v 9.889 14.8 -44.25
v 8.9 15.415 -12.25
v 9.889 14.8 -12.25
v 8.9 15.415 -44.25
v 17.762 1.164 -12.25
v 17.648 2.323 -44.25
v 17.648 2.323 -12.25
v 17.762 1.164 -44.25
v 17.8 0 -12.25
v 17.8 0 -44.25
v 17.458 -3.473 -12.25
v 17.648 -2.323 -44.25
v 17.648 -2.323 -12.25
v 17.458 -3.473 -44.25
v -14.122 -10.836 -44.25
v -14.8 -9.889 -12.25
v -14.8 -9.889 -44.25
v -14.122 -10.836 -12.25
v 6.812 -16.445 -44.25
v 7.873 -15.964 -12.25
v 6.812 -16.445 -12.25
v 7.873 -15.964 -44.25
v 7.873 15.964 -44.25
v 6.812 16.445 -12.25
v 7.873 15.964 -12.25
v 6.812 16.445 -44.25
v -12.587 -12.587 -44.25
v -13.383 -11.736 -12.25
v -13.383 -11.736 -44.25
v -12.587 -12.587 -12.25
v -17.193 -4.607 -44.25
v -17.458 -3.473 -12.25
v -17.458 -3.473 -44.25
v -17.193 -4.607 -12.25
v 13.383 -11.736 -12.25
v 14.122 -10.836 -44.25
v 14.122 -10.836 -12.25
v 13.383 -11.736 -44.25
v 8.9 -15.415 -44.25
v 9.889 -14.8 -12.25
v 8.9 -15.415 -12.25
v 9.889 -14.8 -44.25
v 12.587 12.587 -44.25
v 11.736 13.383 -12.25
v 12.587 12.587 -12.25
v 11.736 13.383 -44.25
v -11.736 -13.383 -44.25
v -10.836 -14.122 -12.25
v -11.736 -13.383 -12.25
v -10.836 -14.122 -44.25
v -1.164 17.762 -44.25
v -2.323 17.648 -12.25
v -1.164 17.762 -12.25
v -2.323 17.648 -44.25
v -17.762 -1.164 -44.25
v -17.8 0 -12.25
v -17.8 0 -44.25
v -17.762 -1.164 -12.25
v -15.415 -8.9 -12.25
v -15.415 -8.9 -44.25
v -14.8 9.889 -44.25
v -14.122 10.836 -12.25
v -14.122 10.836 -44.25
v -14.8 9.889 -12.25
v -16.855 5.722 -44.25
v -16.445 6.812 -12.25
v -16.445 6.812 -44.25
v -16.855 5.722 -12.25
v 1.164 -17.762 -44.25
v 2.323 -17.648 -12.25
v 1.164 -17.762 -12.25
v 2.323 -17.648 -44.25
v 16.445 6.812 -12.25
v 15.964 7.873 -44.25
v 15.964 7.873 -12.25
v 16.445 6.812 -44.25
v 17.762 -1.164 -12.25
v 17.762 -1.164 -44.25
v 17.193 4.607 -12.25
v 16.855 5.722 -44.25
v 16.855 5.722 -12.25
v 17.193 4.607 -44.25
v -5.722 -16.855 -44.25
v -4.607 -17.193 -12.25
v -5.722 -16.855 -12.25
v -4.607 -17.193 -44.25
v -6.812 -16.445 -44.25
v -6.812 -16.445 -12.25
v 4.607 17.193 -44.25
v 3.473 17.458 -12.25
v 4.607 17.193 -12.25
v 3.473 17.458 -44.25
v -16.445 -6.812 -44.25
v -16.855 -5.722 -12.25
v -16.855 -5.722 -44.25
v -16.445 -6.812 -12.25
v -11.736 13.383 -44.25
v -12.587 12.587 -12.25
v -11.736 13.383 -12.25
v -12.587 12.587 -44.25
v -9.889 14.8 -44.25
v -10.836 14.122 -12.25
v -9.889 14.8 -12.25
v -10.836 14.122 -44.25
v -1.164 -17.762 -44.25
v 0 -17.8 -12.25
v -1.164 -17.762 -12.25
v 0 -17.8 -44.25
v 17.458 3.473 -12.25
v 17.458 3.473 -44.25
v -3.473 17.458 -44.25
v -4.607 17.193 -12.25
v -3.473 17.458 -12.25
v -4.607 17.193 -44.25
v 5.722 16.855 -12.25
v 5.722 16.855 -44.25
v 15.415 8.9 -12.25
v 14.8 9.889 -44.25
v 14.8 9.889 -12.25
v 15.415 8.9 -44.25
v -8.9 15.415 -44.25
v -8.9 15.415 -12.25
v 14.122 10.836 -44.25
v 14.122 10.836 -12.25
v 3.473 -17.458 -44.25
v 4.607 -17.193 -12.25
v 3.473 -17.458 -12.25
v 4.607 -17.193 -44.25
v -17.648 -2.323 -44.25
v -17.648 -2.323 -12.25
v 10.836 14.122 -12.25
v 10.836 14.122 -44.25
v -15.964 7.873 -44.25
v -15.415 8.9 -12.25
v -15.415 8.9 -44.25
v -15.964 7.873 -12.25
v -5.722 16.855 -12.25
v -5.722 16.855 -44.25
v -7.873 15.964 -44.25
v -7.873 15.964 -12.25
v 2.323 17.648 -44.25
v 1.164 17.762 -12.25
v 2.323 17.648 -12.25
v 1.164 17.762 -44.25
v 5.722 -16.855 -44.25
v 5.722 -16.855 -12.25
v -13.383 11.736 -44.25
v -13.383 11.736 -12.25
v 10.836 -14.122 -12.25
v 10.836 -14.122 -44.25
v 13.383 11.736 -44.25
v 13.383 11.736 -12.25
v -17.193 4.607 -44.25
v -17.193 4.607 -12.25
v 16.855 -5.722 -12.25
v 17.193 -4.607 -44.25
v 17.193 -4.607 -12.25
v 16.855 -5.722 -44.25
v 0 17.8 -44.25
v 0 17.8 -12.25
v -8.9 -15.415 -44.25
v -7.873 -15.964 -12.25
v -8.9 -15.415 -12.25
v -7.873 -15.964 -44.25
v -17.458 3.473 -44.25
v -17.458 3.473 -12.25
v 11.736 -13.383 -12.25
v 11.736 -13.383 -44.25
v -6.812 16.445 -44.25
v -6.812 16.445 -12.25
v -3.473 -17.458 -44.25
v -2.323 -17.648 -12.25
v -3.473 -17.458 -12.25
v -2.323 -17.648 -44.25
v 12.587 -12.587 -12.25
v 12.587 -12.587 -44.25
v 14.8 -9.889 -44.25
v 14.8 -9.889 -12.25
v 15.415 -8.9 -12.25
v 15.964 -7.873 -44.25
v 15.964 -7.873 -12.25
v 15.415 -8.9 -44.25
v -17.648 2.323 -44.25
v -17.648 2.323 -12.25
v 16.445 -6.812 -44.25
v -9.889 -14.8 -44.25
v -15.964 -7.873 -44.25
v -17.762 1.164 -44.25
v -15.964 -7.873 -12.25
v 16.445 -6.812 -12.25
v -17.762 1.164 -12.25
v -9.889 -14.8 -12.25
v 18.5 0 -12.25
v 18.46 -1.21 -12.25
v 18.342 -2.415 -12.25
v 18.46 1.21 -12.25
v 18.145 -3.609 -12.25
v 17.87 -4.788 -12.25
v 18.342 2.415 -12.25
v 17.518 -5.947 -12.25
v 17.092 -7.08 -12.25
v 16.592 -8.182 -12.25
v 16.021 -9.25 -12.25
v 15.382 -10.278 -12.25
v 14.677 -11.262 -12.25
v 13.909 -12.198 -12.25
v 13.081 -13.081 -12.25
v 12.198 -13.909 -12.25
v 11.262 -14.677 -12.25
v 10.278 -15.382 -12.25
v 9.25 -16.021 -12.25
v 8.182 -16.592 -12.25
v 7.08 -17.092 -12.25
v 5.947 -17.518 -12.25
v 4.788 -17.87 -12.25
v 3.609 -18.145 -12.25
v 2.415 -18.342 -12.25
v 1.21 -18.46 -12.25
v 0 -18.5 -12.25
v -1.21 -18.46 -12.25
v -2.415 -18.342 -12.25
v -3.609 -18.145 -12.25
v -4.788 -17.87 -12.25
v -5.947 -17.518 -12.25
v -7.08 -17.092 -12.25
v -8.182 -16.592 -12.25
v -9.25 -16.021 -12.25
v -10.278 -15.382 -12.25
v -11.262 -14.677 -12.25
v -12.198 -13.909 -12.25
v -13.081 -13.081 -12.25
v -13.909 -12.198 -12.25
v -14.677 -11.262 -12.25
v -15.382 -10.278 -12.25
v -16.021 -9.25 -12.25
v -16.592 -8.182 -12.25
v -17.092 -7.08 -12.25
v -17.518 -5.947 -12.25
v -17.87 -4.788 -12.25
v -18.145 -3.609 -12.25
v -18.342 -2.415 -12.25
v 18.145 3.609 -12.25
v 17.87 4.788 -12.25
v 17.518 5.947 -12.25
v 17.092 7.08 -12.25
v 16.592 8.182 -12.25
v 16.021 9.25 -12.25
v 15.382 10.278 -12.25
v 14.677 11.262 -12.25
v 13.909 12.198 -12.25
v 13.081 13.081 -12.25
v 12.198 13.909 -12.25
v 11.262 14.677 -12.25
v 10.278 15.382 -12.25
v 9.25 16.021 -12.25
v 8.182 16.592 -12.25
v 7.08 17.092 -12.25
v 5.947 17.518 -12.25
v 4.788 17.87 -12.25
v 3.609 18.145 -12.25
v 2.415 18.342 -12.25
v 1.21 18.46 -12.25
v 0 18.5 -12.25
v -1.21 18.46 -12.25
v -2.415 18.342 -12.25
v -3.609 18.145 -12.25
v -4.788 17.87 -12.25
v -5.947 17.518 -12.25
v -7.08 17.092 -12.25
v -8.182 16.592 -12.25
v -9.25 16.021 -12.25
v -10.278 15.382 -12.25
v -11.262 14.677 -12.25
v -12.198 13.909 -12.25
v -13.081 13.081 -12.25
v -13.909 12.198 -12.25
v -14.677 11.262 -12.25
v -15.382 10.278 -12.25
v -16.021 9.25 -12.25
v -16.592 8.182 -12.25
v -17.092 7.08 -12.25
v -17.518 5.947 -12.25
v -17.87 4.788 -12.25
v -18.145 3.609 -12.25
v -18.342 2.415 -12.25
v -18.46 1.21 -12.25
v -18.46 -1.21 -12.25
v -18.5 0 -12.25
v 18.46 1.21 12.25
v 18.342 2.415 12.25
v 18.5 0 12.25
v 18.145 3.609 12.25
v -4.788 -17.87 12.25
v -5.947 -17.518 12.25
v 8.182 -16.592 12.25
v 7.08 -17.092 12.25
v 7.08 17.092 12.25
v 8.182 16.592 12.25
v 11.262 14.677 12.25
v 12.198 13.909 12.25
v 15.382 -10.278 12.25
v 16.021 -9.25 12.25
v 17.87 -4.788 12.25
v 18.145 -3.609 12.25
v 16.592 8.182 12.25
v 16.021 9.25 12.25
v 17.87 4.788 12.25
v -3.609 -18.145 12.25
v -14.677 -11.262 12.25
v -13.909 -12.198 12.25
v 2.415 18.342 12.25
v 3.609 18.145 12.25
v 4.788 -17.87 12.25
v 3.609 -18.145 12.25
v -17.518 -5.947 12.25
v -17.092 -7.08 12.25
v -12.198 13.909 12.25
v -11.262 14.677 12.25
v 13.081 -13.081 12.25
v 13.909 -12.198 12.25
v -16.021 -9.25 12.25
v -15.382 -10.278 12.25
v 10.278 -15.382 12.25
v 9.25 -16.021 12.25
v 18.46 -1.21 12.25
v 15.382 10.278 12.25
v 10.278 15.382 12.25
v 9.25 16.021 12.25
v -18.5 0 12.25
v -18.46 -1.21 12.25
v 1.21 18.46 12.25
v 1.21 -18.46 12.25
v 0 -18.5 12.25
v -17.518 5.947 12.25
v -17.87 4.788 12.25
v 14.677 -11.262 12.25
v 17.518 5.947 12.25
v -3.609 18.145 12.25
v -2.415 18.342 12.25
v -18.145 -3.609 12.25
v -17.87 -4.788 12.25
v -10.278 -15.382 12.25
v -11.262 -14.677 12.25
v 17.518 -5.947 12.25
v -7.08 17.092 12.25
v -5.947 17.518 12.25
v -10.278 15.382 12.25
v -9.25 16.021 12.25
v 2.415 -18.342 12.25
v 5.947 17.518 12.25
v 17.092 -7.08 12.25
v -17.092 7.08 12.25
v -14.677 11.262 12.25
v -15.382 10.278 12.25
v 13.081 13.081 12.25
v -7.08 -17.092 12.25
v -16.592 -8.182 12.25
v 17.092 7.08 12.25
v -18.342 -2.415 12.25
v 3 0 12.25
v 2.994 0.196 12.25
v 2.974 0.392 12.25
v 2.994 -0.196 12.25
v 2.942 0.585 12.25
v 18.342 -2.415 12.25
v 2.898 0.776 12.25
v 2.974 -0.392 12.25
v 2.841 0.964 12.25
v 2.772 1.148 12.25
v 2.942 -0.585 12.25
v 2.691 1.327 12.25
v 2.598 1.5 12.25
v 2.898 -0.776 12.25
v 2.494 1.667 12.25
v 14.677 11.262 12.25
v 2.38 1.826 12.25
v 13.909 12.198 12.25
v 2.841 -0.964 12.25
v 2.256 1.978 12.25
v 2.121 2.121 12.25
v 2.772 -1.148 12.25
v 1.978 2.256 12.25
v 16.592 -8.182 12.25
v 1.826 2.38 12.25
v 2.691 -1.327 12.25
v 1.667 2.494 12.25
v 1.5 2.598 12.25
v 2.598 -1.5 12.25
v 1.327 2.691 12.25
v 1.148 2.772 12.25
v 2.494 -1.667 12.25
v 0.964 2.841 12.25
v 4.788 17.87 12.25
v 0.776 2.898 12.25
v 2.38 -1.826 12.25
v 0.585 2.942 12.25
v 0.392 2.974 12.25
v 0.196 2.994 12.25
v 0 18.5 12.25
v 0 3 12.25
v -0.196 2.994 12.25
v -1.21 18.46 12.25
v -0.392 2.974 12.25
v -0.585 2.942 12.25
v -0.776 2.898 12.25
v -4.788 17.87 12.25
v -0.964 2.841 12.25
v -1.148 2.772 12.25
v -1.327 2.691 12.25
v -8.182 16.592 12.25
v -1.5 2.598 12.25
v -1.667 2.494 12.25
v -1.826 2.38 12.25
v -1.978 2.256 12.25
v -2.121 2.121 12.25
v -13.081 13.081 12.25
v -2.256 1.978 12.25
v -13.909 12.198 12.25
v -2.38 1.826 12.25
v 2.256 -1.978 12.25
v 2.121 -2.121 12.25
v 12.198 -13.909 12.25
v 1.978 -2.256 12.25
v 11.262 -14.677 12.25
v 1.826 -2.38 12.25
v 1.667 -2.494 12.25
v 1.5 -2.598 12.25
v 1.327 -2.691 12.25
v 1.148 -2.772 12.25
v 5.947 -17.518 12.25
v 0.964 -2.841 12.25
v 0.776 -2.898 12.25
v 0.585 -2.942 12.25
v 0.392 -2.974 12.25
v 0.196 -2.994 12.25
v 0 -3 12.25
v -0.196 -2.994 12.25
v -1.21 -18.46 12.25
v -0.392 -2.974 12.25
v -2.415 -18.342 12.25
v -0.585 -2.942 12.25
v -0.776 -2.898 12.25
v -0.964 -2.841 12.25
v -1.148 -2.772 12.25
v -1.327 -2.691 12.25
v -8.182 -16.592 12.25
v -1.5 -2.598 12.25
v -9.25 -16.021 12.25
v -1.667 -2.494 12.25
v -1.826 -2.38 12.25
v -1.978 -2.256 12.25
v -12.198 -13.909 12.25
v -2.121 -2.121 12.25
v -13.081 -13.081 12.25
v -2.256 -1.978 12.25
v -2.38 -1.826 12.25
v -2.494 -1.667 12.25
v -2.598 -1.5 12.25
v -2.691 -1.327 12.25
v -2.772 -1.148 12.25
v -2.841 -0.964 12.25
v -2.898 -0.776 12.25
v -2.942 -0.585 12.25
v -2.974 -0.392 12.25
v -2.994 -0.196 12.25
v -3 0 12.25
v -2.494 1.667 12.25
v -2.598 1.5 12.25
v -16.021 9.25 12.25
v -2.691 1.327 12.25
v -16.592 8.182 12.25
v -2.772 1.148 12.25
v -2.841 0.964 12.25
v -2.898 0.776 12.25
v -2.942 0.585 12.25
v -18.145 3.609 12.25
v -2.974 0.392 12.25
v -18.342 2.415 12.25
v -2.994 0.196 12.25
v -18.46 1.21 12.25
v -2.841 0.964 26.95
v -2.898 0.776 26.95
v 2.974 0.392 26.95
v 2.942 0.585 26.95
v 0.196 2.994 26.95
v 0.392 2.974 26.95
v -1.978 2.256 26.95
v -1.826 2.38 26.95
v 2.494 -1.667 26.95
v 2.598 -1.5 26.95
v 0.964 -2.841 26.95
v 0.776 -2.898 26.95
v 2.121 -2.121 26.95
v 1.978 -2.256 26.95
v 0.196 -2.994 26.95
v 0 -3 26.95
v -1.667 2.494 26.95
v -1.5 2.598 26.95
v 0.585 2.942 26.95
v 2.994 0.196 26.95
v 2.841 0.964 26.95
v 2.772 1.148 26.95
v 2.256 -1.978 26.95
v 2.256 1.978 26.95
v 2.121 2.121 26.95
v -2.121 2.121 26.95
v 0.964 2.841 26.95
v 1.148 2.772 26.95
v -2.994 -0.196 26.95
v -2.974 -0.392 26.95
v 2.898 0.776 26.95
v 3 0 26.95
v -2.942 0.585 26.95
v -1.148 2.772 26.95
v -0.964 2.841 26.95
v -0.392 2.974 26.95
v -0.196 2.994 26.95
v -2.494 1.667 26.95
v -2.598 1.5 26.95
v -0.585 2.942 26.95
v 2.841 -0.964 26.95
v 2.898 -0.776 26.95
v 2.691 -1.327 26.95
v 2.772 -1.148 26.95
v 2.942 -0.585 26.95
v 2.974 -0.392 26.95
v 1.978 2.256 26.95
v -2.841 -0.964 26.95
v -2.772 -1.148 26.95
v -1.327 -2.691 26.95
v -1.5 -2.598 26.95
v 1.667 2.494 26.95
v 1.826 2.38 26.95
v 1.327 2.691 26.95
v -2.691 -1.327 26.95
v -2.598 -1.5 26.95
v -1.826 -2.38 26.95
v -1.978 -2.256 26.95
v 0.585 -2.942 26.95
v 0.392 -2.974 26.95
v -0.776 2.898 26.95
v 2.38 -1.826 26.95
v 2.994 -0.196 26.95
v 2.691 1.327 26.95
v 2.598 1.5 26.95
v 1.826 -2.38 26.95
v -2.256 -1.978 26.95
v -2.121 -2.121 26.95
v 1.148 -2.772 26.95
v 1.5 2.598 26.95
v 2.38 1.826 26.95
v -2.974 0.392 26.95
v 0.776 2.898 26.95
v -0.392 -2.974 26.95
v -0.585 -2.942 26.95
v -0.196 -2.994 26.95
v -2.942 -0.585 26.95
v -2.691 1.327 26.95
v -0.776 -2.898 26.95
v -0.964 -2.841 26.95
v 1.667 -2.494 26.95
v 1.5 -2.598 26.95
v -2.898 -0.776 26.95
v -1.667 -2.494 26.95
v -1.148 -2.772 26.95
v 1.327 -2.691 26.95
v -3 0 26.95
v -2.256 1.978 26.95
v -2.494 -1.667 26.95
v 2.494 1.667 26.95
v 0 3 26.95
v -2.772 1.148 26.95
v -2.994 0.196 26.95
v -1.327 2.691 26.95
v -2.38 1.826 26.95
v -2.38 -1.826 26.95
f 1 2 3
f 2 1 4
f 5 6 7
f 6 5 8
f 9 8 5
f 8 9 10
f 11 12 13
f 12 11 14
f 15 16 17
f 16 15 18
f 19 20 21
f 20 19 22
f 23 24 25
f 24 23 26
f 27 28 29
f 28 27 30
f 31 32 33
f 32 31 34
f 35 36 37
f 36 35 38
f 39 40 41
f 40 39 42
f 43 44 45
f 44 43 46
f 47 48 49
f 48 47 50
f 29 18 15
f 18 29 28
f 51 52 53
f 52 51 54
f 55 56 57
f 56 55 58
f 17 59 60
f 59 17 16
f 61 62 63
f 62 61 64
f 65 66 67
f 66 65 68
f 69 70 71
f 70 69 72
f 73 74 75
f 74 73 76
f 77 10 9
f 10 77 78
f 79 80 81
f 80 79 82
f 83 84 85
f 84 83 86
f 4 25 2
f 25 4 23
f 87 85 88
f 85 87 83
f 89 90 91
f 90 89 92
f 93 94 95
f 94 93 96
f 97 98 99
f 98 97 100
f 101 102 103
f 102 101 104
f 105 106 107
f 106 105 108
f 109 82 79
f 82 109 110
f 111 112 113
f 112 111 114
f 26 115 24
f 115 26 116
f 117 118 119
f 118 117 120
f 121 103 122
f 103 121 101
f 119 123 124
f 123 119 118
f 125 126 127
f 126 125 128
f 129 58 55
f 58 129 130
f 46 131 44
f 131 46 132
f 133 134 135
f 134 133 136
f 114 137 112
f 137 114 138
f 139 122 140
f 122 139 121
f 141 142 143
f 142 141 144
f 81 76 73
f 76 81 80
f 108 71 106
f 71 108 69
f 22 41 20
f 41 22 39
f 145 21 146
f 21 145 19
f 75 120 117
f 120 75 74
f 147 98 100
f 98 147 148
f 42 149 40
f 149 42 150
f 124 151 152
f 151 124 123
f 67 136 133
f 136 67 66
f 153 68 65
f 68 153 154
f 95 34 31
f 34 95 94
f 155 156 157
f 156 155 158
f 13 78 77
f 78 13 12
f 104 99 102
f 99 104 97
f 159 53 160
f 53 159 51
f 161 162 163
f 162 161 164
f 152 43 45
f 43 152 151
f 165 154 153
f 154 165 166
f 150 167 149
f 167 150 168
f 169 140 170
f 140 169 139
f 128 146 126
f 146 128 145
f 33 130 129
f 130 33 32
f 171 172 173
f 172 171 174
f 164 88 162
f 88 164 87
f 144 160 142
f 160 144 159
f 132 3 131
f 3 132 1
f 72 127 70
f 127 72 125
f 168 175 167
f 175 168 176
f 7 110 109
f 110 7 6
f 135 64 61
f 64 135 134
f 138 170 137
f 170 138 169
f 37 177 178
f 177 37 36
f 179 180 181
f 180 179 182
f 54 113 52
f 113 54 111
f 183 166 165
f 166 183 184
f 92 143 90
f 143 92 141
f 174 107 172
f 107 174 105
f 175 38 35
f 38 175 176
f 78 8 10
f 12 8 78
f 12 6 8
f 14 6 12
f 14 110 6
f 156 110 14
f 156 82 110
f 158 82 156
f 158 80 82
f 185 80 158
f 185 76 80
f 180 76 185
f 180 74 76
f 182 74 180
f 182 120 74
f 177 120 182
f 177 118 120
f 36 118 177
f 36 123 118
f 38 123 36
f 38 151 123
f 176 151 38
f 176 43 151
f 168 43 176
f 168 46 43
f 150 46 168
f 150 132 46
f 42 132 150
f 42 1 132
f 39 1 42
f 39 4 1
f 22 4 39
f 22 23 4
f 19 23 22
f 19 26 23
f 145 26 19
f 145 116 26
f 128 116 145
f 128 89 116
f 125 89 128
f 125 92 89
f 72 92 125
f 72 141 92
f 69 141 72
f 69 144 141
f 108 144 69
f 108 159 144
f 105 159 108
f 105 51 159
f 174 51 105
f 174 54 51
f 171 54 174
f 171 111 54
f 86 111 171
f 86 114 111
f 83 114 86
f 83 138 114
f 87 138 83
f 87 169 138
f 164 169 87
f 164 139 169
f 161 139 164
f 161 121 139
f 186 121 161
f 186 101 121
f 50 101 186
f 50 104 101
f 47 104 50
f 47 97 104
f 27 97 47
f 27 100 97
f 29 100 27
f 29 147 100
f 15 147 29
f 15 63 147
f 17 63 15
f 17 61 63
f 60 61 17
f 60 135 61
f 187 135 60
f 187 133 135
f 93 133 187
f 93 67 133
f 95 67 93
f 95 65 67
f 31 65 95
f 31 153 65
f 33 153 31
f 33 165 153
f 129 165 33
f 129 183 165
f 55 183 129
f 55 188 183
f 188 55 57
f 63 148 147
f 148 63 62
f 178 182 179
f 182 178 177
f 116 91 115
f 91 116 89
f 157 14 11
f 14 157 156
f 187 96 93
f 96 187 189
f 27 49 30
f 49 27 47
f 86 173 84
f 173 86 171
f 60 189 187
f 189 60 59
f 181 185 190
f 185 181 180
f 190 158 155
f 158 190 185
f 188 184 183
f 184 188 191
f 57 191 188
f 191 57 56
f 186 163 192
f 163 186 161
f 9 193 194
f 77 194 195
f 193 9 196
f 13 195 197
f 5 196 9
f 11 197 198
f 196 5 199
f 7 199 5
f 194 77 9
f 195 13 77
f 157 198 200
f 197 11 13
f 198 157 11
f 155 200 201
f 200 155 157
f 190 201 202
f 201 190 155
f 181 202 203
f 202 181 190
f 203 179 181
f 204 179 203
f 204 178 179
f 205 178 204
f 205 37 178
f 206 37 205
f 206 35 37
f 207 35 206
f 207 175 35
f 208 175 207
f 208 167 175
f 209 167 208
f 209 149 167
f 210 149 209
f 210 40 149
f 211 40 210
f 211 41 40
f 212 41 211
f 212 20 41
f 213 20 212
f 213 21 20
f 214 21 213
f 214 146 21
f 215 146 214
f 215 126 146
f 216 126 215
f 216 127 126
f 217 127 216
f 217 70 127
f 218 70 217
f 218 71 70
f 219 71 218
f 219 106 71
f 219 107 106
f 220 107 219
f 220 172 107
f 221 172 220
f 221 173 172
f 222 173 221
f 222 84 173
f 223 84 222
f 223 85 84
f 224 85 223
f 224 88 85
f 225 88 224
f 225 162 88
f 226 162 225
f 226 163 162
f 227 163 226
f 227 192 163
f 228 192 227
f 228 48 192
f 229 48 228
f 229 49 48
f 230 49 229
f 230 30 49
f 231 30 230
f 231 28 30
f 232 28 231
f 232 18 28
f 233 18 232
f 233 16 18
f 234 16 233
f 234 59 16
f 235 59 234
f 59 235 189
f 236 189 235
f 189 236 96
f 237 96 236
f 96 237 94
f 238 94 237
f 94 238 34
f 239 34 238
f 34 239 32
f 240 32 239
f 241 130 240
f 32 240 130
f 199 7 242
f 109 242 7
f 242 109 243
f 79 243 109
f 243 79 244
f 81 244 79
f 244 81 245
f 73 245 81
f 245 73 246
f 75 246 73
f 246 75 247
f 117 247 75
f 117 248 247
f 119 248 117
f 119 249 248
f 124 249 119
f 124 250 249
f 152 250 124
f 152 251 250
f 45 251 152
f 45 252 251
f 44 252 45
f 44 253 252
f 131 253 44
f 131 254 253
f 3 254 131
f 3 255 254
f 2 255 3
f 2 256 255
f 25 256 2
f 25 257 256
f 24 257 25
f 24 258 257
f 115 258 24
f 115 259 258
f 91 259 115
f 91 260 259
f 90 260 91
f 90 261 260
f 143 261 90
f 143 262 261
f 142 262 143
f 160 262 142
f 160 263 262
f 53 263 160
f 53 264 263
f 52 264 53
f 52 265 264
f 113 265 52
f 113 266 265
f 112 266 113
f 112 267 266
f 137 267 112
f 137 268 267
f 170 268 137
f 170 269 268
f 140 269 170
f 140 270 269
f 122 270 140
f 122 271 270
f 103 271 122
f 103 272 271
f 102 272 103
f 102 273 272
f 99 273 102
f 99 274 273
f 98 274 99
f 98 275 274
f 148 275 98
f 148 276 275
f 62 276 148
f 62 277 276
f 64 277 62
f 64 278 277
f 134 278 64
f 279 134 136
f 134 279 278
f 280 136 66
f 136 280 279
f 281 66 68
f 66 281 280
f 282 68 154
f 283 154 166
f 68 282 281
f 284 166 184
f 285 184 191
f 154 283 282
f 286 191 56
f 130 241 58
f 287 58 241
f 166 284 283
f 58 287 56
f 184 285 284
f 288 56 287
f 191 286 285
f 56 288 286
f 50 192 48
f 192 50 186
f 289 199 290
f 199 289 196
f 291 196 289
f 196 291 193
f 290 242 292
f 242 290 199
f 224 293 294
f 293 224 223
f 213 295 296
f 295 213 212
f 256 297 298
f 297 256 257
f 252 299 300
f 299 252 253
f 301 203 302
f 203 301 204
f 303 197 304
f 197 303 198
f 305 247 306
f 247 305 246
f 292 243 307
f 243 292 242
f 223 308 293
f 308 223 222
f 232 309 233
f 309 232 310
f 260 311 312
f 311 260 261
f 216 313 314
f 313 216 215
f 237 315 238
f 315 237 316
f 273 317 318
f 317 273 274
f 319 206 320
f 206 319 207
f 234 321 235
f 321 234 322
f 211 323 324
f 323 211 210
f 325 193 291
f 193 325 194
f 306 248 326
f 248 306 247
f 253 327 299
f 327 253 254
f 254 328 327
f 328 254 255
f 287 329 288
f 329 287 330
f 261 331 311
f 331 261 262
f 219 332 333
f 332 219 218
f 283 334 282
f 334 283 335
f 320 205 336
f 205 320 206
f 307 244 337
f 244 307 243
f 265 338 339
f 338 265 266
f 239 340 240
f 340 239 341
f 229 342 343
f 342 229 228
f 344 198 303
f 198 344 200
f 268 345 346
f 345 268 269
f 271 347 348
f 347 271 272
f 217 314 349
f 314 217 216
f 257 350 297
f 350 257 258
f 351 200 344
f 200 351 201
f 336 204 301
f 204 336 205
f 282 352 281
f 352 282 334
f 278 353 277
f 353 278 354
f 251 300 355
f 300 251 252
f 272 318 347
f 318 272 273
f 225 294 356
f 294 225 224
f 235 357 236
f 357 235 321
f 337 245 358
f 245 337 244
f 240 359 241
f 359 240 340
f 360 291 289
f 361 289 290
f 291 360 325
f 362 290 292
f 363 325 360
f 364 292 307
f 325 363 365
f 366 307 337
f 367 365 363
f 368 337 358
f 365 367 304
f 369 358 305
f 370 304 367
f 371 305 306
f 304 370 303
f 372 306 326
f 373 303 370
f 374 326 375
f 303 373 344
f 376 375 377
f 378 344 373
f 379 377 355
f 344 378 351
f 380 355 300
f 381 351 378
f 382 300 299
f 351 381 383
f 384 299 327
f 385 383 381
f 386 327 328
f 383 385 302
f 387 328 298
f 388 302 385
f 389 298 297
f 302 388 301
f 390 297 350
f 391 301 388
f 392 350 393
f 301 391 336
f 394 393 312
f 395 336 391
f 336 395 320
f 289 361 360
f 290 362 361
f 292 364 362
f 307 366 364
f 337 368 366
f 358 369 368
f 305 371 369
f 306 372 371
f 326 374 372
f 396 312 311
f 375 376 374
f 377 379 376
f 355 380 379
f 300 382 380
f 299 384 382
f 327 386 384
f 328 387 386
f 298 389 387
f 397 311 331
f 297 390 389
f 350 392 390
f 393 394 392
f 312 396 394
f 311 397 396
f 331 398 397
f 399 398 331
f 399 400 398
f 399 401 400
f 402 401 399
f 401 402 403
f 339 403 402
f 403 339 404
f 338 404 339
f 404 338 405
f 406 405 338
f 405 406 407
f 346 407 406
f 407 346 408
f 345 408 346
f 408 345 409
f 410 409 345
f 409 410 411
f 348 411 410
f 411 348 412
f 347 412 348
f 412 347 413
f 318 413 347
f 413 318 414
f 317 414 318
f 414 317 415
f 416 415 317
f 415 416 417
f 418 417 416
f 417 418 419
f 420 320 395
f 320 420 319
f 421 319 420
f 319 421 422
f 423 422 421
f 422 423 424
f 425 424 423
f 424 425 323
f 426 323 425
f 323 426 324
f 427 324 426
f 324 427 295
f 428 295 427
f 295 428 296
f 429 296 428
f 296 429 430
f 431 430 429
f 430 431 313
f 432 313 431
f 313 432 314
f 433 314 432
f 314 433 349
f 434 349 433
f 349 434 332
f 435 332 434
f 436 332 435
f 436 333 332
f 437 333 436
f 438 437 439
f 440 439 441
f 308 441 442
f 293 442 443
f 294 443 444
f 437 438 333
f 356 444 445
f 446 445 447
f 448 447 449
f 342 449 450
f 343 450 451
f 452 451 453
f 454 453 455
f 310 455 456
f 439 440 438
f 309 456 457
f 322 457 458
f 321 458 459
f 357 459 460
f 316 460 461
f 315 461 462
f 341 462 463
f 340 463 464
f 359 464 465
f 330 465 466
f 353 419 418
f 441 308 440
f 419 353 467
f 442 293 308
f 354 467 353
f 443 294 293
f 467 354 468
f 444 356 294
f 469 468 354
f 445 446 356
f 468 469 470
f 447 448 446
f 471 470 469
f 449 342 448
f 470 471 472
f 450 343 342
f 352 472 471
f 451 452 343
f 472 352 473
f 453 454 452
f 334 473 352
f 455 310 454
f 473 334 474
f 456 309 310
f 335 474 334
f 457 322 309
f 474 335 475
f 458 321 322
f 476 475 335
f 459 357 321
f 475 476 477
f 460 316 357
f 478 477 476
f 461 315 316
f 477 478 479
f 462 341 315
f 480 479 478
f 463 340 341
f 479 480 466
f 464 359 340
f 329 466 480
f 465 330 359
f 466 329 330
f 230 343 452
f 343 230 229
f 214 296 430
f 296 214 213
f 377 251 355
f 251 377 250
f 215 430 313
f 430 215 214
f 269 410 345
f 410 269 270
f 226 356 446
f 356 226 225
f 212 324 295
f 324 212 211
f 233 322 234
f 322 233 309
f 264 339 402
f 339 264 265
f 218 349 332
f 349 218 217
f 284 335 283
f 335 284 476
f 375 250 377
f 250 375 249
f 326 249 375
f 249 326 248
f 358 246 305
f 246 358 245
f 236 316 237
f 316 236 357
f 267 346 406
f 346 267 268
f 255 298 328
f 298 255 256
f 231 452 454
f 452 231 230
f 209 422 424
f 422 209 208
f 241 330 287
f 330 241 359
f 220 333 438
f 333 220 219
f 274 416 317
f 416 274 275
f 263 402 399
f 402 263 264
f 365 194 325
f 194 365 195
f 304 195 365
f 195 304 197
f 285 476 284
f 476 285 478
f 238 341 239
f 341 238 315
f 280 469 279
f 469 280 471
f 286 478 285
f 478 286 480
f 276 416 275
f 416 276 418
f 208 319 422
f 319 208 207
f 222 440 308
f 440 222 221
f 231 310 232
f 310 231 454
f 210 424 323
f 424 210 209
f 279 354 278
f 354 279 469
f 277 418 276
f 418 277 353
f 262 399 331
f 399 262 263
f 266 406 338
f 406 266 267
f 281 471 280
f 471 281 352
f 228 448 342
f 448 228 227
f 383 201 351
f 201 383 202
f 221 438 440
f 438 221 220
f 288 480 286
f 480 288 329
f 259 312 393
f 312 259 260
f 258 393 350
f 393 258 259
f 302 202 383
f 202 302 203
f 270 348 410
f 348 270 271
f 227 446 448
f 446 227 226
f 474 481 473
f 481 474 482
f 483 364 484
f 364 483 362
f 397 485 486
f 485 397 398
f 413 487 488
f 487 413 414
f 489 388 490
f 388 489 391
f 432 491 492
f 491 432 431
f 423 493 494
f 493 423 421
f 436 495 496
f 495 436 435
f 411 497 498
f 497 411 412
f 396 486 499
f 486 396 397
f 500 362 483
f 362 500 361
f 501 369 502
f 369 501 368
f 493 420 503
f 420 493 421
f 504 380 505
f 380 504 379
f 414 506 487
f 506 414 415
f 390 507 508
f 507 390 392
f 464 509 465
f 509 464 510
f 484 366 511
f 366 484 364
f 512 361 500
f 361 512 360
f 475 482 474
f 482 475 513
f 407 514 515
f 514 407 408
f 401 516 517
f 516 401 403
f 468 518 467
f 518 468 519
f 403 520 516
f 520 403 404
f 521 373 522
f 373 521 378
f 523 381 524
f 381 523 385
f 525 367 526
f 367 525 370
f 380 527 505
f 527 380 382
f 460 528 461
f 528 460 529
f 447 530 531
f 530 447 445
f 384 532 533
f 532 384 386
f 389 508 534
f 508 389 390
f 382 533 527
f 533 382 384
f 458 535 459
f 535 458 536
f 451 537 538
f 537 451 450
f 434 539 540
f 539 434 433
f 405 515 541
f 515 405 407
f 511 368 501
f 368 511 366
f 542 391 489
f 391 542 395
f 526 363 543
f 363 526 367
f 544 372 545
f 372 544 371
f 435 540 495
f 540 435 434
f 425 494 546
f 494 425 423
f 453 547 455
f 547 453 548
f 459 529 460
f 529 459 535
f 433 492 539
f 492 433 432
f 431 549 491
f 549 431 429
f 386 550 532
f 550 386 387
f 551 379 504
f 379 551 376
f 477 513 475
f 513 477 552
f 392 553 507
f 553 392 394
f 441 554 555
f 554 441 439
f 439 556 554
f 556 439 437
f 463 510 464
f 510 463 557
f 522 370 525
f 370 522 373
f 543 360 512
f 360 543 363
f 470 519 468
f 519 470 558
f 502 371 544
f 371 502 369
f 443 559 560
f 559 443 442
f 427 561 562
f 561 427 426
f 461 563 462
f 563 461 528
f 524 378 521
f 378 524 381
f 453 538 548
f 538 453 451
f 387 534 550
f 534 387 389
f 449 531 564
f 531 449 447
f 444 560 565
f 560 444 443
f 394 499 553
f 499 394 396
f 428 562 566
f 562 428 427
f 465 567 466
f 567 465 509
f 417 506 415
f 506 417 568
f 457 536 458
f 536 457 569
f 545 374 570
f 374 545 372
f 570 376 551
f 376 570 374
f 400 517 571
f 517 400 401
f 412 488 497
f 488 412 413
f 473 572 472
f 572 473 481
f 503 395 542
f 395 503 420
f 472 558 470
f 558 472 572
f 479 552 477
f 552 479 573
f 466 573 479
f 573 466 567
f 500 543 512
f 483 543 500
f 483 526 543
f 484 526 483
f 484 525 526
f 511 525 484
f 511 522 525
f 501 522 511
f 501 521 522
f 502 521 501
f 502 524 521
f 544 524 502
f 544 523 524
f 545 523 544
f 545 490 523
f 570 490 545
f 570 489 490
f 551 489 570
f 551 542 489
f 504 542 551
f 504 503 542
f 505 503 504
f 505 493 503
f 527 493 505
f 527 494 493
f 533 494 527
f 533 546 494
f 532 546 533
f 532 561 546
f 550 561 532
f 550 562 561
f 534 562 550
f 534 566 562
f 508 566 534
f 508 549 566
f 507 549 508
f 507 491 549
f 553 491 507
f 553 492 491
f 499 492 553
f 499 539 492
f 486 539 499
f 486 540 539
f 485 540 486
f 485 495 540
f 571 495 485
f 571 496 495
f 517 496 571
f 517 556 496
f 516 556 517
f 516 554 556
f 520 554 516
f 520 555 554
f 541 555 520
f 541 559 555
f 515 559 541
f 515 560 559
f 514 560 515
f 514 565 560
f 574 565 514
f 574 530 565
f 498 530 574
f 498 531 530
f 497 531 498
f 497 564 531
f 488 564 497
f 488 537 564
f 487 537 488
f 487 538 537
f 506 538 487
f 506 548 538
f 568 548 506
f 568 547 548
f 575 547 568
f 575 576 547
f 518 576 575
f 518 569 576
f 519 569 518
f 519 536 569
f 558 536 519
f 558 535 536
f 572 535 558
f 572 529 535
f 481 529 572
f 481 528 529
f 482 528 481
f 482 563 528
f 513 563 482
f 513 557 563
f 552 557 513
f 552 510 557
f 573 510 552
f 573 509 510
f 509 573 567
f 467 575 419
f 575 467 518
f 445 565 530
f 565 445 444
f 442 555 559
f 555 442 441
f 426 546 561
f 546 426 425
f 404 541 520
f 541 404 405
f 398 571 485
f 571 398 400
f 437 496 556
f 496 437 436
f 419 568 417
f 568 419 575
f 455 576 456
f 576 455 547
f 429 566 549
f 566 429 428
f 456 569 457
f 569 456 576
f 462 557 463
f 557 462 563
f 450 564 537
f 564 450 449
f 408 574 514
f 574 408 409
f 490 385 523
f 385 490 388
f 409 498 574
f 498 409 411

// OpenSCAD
$fn = 96;

module gearbox(d=37, h=24.5) {
    cylinder(d=d, h=h, center=true);
}

module motor_body(d=35.6, l=32) {
    cylinder(d=d, h=l, center=true);
}

module shaft(d=6, l=14.7) {
    cylinder(d=d, h=l, center=true);
}

module geared_dc_motor() {
    // Axis along Z, gearbox above motor, shaft above gearbox
    union() {
        // Motor body (rear)
        translate([0,0,-(24.5/2 + 32/2)])
            motor_body(d=35.6, l=32);

        // Gearbox (front)
        gearbox(d=37, h=24.5);

        // Shaft
        translate([0,0,(24.5/2 + 14.7/2)])
            shaft(d=6, l=14.7);
    }
}

geared_dc_motor();
